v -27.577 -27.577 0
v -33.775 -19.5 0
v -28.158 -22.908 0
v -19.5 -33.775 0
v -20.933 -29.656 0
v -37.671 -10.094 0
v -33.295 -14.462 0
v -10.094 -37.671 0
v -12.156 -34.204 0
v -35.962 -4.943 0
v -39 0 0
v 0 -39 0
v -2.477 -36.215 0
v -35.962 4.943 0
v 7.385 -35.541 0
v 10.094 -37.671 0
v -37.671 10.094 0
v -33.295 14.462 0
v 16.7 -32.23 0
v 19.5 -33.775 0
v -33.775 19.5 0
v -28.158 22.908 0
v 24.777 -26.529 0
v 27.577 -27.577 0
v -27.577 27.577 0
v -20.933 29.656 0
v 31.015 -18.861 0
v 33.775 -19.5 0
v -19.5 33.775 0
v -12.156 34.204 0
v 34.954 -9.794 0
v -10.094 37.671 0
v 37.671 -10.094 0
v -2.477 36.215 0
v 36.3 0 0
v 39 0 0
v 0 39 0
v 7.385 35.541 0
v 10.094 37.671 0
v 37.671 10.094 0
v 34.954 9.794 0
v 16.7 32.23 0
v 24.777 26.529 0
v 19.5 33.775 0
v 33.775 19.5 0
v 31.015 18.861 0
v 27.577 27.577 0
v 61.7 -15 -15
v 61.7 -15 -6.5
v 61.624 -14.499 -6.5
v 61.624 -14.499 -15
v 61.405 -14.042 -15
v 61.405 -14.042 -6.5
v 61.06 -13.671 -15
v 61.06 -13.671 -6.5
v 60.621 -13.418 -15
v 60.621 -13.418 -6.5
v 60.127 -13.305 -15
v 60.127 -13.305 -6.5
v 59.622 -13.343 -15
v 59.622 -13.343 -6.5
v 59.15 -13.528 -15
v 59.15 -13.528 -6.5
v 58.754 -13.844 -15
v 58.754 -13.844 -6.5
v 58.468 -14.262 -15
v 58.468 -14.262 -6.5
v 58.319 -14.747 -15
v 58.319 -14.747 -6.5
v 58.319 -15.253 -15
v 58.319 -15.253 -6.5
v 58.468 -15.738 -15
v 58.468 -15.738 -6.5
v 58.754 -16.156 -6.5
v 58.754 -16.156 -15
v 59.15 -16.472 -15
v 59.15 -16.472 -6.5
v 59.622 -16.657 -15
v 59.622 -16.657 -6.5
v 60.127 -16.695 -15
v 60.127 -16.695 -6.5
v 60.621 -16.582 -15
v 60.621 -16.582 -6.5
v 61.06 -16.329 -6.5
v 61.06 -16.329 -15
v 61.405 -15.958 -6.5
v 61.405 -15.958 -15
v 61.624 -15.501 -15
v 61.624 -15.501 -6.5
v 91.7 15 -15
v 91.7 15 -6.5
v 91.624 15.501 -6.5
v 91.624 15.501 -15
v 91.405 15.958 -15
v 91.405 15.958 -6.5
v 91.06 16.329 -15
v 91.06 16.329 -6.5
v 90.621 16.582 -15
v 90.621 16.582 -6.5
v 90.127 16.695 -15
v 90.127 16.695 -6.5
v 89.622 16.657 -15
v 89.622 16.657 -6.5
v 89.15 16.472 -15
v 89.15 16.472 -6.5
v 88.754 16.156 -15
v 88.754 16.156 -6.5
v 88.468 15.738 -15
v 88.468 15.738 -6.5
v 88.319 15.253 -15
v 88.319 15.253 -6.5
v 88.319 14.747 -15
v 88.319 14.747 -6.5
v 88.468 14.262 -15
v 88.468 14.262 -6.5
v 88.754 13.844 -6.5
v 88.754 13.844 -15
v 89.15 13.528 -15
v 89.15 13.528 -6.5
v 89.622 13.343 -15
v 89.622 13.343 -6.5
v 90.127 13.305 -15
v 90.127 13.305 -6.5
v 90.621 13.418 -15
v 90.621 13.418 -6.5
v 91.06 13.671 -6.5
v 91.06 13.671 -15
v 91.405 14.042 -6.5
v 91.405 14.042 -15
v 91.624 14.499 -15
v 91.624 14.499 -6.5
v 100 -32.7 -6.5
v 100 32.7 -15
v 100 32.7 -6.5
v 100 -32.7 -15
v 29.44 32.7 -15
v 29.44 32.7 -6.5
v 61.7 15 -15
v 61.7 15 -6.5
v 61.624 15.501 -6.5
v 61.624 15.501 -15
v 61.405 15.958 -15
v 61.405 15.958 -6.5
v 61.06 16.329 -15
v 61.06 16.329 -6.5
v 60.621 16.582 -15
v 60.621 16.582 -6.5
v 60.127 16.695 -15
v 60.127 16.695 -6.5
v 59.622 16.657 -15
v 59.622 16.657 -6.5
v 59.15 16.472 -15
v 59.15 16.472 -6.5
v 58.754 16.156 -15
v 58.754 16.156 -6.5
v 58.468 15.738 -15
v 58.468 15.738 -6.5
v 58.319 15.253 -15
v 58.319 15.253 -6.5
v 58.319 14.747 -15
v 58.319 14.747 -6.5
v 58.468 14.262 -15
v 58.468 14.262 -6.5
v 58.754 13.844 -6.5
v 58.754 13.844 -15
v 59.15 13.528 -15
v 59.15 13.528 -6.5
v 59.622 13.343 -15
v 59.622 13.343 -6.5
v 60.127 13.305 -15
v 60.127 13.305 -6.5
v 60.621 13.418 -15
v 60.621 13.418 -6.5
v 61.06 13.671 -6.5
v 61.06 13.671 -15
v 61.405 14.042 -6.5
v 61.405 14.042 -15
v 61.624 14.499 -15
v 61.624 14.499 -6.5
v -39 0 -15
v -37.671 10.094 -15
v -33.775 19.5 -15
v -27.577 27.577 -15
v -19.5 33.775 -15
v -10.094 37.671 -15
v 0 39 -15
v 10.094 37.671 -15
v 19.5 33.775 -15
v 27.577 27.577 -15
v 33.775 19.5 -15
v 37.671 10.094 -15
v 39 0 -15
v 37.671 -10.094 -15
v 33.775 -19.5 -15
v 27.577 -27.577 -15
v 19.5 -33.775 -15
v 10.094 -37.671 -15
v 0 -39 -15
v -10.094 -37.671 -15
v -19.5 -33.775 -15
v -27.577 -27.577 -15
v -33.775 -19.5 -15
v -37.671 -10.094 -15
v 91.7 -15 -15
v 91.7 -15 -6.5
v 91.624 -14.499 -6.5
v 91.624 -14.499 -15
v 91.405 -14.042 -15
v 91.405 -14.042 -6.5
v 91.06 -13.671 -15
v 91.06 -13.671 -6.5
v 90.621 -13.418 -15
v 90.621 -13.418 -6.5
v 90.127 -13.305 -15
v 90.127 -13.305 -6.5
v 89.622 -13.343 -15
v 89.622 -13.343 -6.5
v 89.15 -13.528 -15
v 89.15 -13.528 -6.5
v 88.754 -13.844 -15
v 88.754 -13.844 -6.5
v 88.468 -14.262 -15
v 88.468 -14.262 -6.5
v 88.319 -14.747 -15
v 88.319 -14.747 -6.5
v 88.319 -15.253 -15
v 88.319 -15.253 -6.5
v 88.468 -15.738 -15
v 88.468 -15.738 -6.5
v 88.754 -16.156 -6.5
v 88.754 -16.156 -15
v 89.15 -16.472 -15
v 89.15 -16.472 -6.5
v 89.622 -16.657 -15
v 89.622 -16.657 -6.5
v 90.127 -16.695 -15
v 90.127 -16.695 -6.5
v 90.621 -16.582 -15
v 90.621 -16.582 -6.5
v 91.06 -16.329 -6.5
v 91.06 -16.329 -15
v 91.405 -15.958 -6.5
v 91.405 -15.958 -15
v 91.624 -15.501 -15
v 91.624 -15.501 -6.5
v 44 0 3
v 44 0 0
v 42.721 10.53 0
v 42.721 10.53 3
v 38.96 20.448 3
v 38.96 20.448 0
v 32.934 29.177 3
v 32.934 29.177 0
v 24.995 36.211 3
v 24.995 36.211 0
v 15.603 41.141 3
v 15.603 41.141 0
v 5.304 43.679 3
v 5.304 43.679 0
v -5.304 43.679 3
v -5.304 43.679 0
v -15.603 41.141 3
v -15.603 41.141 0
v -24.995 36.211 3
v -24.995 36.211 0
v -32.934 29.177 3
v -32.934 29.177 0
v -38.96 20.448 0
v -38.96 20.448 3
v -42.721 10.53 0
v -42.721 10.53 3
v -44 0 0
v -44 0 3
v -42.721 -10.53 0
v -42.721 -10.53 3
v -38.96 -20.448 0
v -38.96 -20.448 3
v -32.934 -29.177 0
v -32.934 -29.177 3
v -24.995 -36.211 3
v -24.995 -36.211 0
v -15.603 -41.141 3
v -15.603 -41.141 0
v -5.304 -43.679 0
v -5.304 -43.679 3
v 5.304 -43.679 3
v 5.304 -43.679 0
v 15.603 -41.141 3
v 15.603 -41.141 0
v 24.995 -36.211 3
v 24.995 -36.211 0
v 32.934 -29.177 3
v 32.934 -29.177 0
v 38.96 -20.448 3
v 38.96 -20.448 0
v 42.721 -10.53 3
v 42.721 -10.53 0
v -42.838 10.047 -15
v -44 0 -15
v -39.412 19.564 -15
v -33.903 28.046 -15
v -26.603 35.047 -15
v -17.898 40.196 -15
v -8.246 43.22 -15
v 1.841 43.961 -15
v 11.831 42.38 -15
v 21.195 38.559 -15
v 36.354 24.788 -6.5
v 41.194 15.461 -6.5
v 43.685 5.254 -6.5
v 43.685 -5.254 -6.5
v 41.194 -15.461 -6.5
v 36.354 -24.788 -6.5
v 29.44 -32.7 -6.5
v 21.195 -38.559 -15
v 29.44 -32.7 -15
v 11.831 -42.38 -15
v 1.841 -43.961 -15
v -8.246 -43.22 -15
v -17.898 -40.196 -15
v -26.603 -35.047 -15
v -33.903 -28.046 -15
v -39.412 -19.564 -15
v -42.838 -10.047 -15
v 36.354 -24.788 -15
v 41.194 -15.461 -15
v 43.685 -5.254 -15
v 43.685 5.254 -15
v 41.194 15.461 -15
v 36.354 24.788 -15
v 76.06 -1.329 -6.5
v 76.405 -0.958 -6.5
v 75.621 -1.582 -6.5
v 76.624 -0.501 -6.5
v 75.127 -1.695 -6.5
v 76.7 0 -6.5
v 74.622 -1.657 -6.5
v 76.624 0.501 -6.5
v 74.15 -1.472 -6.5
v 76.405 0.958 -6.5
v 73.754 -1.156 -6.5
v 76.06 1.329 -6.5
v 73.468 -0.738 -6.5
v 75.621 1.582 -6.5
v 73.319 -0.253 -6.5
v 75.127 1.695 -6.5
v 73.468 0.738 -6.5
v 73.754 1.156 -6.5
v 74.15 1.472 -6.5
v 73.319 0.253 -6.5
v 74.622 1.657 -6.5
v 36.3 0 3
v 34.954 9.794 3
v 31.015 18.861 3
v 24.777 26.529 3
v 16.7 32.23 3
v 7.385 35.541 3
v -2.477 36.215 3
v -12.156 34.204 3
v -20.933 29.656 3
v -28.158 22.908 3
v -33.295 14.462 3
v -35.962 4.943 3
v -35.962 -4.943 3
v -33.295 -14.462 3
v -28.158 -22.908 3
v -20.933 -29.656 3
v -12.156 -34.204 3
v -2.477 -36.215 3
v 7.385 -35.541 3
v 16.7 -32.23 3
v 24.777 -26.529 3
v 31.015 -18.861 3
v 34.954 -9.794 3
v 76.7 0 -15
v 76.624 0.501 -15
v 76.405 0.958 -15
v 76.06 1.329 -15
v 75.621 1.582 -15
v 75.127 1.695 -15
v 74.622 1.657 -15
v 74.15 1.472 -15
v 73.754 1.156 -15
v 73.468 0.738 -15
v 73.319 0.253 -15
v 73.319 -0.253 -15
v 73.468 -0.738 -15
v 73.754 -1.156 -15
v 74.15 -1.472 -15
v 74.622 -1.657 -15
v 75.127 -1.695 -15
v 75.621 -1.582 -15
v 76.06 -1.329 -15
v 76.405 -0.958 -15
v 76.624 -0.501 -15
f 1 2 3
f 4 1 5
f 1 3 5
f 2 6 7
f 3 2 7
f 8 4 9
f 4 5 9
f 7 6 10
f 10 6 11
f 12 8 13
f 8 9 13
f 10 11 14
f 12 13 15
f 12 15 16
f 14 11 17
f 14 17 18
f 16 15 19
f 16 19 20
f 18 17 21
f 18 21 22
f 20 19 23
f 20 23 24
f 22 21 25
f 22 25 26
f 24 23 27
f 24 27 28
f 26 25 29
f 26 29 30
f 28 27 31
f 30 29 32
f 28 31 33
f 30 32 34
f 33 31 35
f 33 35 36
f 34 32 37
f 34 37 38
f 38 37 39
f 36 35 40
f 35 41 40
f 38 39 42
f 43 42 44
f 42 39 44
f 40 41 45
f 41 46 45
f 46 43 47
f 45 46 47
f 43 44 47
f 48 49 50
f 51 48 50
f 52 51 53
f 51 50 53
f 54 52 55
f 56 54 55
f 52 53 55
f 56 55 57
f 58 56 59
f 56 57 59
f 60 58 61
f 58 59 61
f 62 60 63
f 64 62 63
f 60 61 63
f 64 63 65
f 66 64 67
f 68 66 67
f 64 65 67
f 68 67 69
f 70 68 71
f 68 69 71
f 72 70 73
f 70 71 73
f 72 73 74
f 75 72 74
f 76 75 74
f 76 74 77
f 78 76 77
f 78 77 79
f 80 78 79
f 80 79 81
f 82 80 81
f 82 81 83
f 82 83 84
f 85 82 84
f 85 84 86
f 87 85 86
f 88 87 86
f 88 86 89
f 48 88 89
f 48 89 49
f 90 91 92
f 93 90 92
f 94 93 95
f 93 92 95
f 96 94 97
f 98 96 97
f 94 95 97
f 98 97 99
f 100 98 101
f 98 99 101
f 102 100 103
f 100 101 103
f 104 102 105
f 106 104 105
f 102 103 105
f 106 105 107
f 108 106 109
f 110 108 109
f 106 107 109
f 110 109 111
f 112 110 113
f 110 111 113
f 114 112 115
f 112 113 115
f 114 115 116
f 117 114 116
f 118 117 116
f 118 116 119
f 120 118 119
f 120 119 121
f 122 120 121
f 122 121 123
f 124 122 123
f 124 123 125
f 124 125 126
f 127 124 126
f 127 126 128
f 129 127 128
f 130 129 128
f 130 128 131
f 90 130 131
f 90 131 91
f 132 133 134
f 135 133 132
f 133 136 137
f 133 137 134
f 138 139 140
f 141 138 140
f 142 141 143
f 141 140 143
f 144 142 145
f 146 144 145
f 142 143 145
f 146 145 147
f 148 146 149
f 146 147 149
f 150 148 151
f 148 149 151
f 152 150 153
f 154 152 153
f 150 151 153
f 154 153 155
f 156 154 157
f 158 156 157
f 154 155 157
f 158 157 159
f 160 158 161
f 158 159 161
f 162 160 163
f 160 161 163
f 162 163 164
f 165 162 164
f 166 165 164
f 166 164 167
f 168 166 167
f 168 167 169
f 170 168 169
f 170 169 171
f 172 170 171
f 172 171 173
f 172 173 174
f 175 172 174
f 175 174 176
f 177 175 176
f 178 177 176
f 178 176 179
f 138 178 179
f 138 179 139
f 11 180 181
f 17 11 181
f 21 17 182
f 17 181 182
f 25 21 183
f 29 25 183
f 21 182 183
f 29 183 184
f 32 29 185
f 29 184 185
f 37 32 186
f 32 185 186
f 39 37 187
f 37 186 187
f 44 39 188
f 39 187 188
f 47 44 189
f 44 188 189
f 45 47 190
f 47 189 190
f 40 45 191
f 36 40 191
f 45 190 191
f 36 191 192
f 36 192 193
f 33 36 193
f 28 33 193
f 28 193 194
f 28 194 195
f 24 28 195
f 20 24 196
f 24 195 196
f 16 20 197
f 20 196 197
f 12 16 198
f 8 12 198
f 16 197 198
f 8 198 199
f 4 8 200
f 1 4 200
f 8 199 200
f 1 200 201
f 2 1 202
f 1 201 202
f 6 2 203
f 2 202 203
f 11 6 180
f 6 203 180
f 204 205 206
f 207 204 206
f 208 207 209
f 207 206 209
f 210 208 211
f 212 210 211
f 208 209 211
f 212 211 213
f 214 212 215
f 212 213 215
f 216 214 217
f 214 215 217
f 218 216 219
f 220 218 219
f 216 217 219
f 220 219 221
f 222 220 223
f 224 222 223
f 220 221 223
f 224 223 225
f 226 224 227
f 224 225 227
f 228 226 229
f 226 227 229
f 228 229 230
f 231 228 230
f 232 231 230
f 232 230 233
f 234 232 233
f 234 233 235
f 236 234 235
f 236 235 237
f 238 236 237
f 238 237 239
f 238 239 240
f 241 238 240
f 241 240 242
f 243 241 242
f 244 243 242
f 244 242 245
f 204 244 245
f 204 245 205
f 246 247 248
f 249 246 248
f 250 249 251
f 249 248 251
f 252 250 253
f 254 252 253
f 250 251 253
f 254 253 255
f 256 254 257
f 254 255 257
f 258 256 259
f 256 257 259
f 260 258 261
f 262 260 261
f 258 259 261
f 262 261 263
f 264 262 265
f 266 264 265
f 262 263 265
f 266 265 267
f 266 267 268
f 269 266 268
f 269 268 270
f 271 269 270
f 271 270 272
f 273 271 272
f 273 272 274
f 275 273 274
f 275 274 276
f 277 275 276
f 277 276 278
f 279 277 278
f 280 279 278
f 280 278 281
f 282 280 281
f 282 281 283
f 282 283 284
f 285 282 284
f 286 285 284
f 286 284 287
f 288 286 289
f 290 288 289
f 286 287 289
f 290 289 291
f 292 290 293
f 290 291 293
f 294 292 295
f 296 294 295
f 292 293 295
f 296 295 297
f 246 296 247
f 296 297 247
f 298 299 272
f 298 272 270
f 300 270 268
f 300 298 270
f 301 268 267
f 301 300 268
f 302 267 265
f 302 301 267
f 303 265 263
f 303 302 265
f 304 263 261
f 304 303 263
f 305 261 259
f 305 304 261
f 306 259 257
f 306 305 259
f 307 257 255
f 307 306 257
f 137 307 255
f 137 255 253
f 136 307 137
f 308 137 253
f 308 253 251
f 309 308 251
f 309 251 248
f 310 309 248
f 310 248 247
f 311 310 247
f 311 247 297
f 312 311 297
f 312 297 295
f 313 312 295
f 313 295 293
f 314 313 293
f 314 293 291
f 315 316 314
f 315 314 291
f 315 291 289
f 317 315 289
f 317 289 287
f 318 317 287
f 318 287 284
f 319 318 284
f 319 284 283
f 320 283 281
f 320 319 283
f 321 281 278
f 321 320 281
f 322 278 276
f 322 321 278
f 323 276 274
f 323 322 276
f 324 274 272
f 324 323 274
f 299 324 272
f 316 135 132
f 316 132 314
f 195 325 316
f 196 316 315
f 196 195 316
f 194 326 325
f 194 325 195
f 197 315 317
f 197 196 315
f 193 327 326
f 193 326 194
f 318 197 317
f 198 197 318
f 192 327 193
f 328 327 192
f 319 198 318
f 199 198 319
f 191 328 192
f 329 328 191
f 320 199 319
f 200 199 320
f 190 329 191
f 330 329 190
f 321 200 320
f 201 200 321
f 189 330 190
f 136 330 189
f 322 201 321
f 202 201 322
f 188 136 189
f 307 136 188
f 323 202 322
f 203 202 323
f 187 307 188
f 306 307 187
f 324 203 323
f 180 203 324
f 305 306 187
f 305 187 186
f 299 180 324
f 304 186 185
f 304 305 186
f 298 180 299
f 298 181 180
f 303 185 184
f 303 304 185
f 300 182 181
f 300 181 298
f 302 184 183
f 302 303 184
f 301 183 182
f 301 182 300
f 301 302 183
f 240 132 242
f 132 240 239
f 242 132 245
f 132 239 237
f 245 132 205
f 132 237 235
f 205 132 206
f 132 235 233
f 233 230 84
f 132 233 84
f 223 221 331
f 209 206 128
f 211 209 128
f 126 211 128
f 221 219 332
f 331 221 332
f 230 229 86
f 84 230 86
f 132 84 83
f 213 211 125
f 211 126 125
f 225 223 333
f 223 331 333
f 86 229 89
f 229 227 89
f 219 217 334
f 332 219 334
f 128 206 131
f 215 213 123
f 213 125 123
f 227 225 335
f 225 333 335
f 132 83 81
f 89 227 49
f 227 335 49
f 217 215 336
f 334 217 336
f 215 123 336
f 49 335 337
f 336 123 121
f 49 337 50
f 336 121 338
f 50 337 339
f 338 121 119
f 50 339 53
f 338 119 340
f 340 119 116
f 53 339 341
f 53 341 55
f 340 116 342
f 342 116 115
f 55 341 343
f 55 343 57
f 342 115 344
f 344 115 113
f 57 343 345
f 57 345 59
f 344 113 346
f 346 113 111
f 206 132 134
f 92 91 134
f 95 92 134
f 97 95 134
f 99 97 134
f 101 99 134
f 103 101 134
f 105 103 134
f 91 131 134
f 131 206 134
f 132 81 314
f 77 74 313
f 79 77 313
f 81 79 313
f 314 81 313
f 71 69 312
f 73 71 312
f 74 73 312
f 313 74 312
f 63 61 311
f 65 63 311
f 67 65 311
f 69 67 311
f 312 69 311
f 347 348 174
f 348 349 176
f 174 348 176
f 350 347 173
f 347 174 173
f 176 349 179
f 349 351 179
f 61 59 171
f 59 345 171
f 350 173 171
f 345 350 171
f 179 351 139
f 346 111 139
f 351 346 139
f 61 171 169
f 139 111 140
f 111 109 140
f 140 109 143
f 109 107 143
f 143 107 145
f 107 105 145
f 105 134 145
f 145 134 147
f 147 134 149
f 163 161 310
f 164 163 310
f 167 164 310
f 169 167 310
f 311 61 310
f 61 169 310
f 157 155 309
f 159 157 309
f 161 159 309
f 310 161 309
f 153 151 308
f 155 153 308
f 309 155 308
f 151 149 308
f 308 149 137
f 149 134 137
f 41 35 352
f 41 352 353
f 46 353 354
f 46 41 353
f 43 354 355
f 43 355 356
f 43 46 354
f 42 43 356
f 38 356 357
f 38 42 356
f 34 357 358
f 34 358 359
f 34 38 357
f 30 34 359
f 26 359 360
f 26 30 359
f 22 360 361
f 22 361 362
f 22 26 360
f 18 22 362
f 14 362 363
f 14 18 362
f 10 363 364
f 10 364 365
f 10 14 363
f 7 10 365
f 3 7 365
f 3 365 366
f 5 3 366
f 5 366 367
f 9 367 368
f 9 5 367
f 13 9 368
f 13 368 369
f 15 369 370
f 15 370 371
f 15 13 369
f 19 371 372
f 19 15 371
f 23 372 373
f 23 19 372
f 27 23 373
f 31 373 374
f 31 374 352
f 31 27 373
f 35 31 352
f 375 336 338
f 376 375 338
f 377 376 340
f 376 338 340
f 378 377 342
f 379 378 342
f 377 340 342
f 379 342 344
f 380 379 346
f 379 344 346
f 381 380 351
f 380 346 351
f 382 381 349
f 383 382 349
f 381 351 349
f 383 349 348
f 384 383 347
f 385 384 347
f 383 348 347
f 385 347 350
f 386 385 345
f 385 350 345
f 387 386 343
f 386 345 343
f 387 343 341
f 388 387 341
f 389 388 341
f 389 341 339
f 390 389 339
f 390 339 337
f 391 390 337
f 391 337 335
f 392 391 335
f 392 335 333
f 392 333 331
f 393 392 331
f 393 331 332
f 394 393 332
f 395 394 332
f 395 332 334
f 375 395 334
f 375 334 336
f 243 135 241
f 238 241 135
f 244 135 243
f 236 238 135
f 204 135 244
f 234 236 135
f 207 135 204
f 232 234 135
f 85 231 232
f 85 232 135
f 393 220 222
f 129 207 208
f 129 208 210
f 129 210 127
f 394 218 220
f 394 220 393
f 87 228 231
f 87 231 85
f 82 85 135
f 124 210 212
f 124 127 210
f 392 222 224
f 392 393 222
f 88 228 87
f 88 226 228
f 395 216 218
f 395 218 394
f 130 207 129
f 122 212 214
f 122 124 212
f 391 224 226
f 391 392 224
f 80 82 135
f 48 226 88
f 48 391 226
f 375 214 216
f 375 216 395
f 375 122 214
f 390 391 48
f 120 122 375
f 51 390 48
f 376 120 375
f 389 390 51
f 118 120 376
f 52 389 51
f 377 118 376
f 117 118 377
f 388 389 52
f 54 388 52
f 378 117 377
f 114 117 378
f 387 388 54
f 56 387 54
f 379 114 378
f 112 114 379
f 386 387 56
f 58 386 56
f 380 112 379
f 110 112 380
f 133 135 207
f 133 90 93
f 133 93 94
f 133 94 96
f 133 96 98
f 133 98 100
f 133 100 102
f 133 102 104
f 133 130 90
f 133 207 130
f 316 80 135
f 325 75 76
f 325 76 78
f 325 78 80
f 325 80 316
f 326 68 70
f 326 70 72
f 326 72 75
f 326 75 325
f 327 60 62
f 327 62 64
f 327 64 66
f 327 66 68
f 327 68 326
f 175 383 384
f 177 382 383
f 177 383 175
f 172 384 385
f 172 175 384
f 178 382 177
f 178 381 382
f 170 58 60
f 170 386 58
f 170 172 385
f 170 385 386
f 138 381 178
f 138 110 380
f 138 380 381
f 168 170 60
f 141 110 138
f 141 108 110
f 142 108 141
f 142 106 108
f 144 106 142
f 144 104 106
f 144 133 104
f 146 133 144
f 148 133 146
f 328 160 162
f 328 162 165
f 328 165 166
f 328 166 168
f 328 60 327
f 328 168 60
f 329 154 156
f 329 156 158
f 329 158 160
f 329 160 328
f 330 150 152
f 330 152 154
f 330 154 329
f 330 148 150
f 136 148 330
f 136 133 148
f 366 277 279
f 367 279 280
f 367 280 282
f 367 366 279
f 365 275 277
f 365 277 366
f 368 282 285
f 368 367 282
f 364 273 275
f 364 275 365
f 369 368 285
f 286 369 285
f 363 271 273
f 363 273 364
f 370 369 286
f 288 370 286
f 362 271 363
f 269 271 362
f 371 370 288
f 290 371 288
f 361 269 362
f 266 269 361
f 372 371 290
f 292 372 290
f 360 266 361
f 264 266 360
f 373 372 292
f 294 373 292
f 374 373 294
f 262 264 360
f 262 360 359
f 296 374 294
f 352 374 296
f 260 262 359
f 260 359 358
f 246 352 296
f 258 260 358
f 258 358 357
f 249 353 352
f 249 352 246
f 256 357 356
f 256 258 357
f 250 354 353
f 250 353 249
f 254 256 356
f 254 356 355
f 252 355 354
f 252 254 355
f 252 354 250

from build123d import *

# Parameters (mm, degrees)
CROQUIS1_R                   = 44
CROQUIS1_R_2                 = 36.3
SALIENTE_EXTRUIR1_DEPTH      = 3
SALIENTE_EXTRUIR2_START      = 15
CROQUIS2_R                   = 44
CROQUIS2_R_2                 = 39
SALIENTE_EXTRUIR2_DEPTH      = 15
SALIENTE_EXTRUIR3_DEPTH      = 8.5
TALADRO_DE_MARGEN_PARA_M31_D = 3.4


with BuildPart() as part:
    # Croquis1 → Saliente-Extruir1 (new body)
    with BuildSketch(Plane.XY):
        Circle(CROQUIS1_R)
        Circle(CROQUIS1_R_2, mode=Mode.SUBTRACT)
    extrude(amount=SALIENTE_EXTRUIR1_DEPTH)

    # Croquis2 → Saliente-Extruir2 (add)
    with BuildSketch(Plane(origin=(0, 0, 0), x_dir=(-1, 0, 0), z_dir=(0, 0, -1)).offset(SALIENTE_EXTRUIR2_START)):
        Circle(CROQUIS2_R)
        Circle(CROQUIS2_R_2, mode=Mode.SUBTRACT)
    extrude(amount=-SALIENTE_EXTRUIR2_DEPTH)

    # Croquis3 → Saliente-Extruir3 (add)
    with BuildSketch(Plane(origin=(0, 0, -15), x_dir=(-1, 0, 0), z_dir=(0, 0, -1))):
        with BuildLine():
            Line((-29.439938859, 32.7), (-100, 32.7))
            Line((-100, 32.7), (-100, -32.7))
            Line((-100, -32.7), (-29.439938859, -32.7))
            ThreePointArc((-29.439938859, -32.7), (-44, 0), (-29.439938859, 32.7))
        make_face()
    extrude(amount=-SALIENTE_EXTRUIR3_DEPTH)

    # Taladro de margen para M31 (through all)
    with Locations(Plane(origin=(0, 0, -15), x_dir=(-1, 0, 0), z_dir=(0, 0, -1))):
        with Locations((-75, 0), (-90, 15), (-60, -15), (-60, 15), (-90, -15)):
            Hole(TALADRO_DE_MARGEN_PARA_M31_D / 2)


solid = part.part
